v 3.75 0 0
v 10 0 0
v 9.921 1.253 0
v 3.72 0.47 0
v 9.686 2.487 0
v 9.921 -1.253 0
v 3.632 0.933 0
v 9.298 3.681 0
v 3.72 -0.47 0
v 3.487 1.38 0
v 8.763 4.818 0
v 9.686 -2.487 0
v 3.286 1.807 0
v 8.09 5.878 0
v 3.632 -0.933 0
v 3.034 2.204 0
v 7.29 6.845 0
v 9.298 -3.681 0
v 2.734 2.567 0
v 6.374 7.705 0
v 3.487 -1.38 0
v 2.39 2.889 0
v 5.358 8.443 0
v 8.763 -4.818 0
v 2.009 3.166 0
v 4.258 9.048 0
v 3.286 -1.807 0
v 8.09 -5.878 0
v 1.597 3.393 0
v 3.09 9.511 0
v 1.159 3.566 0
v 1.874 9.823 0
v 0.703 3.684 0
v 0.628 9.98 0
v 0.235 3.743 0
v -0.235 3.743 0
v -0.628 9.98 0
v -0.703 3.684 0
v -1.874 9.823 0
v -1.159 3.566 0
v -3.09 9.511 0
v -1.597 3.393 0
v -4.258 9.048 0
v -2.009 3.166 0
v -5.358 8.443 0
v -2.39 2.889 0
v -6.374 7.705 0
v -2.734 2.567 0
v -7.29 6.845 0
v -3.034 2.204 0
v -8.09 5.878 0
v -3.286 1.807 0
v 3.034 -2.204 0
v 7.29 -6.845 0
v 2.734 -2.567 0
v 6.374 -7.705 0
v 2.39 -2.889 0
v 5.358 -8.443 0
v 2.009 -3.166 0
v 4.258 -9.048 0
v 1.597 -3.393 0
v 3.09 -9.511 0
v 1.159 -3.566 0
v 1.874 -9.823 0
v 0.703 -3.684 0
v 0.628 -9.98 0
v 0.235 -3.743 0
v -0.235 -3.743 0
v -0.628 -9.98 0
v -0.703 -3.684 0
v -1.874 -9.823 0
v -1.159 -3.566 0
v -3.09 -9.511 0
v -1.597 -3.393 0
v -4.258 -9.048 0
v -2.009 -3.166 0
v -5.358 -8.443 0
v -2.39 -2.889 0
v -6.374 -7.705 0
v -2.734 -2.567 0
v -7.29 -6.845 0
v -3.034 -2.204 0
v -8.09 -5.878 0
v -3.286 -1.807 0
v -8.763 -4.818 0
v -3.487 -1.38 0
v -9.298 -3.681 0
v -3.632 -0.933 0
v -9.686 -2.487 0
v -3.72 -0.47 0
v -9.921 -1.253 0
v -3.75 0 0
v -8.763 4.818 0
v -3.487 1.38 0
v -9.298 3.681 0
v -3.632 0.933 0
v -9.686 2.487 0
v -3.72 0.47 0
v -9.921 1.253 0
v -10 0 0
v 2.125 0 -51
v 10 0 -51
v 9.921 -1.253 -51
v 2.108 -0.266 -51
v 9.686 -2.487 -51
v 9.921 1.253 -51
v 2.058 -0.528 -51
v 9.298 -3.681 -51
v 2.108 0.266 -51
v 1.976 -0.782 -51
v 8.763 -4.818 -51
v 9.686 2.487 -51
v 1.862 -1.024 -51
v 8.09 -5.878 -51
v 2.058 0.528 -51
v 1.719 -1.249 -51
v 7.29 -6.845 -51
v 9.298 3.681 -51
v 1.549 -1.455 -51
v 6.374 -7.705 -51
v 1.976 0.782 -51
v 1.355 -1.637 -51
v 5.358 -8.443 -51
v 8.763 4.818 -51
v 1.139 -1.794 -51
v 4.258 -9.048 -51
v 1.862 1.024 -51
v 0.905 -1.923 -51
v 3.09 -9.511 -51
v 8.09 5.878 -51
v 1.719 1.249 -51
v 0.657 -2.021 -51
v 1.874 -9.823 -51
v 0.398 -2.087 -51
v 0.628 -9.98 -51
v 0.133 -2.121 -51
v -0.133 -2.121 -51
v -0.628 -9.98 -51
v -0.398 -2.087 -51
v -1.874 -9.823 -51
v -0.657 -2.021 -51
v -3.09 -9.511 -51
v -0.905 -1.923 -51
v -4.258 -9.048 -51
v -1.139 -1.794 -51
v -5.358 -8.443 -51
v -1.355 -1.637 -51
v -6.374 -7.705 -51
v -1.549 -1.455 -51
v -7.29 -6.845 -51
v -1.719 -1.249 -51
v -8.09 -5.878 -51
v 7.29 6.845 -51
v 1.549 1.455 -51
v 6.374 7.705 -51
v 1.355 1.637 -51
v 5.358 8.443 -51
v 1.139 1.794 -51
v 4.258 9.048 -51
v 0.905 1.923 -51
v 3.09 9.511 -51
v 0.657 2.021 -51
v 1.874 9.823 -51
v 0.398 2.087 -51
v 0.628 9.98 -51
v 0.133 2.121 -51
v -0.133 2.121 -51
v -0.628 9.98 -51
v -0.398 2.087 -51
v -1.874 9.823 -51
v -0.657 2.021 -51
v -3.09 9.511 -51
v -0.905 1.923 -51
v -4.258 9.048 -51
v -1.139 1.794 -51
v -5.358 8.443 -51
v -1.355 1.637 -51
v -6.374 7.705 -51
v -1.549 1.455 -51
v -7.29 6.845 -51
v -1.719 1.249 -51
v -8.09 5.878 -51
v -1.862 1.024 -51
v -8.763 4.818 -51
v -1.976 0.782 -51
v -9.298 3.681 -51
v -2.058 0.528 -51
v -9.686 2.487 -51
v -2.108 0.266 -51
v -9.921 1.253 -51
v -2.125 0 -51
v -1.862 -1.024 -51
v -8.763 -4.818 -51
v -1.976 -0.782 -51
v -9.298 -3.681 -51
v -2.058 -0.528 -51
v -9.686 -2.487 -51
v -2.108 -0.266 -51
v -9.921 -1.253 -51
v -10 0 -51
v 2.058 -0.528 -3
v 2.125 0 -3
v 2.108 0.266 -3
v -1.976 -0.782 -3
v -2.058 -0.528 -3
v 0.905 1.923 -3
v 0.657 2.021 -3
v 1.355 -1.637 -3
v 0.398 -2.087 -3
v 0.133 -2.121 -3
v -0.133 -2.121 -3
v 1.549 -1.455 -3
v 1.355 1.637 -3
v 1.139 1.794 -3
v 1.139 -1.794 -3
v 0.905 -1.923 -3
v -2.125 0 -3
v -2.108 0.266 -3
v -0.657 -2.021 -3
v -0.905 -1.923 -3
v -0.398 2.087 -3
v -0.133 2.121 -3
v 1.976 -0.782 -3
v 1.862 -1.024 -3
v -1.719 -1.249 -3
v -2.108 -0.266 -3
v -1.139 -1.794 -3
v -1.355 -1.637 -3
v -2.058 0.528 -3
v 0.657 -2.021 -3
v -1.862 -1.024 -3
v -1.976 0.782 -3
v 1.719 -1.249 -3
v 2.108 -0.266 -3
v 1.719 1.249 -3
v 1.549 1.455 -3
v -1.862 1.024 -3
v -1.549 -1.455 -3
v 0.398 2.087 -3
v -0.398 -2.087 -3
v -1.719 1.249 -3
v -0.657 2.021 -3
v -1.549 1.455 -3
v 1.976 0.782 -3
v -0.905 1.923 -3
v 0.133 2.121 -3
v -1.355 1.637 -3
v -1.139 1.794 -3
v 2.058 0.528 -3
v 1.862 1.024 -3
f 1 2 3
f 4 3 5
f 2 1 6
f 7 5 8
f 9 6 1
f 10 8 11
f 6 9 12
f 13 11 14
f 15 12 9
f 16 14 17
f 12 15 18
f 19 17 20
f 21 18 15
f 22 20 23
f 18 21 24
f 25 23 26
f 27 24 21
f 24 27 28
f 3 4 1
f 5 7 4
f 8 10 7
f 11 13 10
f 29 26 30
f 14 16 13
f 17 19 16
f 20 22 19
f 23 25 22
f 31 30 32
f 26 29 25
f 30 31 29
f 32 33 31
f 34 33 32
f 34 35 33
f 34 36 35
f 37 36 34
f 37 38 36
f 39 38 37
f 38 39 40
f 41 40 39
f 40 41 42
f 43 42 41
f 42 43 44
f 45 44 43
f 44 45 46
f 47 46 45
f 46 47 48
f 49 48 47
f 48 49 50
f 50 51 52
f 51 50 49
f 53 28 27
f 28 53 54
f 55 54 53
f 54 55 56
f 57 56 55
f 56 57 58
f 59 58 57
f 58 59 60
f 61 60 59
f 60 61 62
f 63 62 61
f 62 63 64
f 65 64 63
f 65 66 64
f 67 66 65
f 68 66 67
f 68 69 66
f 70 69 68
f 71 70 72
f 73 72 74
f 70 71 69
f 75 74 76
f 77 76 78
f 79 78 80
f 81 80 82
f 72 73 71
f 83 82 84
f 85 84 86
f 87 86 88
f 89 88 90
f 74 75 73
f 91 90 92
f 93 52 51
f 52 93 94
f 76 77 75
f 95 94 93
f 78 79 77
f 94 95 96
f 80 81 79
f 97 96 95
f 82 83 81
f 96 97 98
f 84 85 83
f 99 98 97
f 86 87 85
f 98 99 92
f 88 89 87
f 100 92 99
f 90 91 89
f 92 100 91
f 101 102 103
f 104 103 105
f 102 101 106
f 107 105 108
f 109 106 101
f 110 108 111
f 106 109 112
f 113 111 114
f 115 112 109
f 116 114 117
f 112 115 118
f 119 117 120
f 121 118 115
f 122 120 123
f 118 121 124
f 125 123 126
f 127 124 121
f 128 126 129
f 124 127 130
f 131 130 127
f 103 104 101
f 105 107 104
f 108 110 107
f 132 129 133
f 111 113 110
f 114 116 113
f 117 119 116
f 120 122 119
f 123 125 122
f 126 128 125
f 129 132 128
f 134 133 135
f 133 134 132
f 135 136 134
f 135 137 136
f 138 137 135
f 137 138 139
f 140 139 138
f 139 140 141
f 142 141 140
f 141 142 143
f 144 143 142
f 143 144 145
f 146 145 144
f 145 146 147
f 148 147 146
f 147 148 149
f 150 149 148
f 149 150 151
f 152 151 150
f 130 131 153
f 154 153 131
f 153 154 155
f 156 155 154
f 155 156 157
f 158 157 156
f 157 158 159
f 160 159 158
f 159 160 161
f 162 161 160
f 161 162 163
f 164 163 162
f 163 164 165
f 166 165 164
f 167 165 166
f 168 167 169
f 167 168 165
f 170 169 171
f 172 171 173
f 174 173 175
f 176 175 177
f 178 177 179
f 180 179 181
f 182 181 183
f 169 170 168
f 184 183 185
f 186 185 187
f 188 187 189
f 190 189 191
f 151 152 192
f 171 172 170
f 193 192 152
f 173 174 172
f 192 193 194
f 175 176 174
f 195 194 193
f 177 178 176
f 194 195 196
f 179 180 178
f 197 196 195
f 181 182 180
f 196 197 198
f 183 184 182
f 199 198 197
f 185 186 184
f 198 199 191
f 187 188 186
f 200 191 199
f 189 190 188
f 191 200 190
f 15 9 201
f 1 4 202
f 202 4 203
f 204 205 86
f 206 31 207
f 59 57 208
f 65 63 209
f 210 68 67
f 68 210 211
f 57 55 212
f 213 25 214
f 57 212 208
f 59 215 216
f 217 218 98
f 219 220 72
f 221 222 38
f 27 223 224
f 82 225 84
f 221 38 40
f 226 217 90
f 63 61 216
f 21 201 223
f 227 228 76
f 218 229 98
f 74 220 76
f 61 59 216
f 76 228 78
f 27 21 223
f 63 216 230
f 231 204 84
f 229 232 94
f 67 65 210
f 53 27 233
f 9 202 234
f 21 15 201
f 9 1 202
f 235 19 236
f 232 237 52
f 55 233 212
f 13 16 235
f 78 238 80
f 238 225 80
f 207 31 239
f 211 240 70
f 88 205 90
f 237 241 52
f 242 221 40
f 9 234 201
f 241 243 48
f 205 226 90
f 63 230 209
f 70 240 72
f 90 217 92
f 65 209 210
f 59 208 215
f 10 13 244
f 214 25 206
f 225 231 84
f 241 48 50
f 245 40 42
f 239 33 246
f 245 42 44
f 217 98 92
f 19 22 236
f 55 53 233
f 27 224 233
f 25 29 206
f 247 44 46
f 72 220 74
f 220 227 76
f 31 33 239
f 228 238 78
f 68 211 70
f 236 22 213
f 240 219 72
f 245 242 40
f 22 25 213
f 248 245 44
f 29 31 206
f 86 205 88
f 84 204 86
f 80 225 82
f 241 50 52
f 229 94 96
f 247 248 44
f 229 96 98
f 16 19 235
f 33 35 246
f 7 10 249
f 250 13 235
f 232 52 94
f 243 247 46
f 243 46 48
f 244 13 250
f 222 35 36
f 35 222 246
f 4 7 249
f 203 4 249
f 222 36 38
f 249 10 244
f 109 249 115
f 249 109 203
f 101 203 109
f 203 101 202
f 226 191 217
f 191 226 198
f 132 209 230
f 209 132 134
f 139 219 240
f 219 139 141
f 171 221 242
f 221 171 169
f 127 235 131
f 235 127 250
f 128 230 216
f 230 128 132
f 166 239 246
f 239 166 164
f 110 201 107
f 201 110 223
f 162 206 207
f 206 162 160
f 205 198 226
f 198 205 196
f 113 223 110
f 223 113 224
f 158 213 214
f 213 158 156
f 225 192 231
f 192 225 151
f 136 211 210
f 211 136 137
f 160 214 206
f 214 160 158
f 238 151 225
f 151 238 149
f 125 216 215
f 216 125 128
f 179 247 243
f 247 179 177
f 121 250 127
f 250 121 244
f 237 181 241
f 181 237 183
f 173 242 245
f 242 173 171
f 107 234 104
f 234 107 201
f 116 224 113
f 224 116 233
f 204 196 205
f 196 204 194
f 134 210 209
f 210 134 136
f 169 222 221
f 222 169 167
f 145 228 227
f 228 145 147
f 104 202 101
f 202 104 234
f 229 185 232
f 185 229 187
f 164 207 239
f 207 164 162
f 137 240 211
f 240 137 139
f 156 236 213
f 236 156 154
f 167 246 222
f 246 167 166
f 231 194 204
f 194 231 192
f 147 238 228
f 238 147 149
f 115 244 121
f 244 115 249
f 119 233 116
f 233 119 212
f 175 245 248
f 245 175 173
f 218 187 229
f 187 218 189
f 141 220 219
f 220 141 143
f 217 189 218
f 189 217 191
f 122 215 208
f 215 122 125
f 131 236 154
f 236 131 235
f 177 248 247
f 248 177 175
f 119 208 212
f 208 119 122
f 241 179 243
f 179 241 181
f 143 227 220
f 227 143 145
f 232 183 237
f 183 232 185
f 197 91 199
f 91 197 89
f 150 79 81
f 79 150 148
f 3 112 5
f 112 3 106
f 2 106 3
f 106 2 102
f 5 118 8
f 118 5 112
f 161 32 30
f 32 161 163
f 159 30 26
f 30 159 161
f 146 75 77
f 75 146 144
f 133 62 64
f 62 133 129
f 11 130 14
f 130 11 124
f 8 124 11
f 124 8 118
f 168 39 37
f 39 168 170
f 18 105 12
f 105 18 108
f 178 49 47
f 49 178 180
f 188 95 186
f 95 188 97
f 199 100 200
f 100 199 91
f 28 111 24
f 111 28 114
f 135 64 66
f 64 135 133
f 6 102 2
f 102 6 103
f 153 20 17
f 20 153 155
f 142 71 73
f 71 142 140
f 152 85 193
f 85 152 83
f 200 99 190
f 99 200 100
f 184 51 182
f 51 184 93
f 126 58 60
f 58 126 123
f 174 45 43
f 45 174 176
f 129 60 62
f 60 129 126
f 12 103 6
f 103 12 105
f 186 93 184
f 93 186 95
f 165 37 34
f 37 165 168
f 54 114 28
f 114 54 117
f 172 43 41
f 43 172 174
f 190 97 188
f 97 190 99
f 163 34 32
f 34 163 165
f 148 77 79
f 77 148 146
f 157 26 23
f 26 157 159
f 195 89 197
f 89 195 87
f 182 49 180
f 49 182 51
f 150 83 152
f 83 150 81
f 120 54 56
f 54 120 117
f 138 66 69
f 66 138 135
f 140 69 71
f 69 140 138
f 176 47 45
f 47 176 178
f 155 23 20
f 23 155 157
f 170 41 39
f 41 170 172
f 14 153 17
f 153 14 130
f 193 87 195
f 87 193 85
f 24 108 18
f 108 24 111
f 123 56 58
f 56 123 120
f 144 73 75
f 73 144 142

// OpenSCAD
$fn = 50;


difference() {
	union() {
		translate(v = [0, 0, -51.0000000000]) {
			cylinder(h = 51, r = 10.0000000000);
		}
		cylinder(h = 0, r = 19.0000000000);
	}
	union() {
		translate(v = [0, 0, 0]) {
			rotate(a = [0, 0, 0]) {
				difference() {
					union() {
						#translate(v = [0, 0, -51.0000000000]) {
							cylinder(h = 51, r = 2.0000000000);
						}
						#translate(v = [0, 0, -3]) {
							cylinder(h = 3, r = 10.0000000000, r1 = 2.1250000000, r2 = 3.7500000000);
						}
						#translate(v = [0, 0, -51.0000000000]) {
							cylinder(h = 51, r = 2.1250000000);
						}
						#translate(v = [0, 0, -51.0000000000]) {
							cylinder(h = 51, r = 2.0000000000);
						}
					}
					union();
				}
			}
		}
	}
}
